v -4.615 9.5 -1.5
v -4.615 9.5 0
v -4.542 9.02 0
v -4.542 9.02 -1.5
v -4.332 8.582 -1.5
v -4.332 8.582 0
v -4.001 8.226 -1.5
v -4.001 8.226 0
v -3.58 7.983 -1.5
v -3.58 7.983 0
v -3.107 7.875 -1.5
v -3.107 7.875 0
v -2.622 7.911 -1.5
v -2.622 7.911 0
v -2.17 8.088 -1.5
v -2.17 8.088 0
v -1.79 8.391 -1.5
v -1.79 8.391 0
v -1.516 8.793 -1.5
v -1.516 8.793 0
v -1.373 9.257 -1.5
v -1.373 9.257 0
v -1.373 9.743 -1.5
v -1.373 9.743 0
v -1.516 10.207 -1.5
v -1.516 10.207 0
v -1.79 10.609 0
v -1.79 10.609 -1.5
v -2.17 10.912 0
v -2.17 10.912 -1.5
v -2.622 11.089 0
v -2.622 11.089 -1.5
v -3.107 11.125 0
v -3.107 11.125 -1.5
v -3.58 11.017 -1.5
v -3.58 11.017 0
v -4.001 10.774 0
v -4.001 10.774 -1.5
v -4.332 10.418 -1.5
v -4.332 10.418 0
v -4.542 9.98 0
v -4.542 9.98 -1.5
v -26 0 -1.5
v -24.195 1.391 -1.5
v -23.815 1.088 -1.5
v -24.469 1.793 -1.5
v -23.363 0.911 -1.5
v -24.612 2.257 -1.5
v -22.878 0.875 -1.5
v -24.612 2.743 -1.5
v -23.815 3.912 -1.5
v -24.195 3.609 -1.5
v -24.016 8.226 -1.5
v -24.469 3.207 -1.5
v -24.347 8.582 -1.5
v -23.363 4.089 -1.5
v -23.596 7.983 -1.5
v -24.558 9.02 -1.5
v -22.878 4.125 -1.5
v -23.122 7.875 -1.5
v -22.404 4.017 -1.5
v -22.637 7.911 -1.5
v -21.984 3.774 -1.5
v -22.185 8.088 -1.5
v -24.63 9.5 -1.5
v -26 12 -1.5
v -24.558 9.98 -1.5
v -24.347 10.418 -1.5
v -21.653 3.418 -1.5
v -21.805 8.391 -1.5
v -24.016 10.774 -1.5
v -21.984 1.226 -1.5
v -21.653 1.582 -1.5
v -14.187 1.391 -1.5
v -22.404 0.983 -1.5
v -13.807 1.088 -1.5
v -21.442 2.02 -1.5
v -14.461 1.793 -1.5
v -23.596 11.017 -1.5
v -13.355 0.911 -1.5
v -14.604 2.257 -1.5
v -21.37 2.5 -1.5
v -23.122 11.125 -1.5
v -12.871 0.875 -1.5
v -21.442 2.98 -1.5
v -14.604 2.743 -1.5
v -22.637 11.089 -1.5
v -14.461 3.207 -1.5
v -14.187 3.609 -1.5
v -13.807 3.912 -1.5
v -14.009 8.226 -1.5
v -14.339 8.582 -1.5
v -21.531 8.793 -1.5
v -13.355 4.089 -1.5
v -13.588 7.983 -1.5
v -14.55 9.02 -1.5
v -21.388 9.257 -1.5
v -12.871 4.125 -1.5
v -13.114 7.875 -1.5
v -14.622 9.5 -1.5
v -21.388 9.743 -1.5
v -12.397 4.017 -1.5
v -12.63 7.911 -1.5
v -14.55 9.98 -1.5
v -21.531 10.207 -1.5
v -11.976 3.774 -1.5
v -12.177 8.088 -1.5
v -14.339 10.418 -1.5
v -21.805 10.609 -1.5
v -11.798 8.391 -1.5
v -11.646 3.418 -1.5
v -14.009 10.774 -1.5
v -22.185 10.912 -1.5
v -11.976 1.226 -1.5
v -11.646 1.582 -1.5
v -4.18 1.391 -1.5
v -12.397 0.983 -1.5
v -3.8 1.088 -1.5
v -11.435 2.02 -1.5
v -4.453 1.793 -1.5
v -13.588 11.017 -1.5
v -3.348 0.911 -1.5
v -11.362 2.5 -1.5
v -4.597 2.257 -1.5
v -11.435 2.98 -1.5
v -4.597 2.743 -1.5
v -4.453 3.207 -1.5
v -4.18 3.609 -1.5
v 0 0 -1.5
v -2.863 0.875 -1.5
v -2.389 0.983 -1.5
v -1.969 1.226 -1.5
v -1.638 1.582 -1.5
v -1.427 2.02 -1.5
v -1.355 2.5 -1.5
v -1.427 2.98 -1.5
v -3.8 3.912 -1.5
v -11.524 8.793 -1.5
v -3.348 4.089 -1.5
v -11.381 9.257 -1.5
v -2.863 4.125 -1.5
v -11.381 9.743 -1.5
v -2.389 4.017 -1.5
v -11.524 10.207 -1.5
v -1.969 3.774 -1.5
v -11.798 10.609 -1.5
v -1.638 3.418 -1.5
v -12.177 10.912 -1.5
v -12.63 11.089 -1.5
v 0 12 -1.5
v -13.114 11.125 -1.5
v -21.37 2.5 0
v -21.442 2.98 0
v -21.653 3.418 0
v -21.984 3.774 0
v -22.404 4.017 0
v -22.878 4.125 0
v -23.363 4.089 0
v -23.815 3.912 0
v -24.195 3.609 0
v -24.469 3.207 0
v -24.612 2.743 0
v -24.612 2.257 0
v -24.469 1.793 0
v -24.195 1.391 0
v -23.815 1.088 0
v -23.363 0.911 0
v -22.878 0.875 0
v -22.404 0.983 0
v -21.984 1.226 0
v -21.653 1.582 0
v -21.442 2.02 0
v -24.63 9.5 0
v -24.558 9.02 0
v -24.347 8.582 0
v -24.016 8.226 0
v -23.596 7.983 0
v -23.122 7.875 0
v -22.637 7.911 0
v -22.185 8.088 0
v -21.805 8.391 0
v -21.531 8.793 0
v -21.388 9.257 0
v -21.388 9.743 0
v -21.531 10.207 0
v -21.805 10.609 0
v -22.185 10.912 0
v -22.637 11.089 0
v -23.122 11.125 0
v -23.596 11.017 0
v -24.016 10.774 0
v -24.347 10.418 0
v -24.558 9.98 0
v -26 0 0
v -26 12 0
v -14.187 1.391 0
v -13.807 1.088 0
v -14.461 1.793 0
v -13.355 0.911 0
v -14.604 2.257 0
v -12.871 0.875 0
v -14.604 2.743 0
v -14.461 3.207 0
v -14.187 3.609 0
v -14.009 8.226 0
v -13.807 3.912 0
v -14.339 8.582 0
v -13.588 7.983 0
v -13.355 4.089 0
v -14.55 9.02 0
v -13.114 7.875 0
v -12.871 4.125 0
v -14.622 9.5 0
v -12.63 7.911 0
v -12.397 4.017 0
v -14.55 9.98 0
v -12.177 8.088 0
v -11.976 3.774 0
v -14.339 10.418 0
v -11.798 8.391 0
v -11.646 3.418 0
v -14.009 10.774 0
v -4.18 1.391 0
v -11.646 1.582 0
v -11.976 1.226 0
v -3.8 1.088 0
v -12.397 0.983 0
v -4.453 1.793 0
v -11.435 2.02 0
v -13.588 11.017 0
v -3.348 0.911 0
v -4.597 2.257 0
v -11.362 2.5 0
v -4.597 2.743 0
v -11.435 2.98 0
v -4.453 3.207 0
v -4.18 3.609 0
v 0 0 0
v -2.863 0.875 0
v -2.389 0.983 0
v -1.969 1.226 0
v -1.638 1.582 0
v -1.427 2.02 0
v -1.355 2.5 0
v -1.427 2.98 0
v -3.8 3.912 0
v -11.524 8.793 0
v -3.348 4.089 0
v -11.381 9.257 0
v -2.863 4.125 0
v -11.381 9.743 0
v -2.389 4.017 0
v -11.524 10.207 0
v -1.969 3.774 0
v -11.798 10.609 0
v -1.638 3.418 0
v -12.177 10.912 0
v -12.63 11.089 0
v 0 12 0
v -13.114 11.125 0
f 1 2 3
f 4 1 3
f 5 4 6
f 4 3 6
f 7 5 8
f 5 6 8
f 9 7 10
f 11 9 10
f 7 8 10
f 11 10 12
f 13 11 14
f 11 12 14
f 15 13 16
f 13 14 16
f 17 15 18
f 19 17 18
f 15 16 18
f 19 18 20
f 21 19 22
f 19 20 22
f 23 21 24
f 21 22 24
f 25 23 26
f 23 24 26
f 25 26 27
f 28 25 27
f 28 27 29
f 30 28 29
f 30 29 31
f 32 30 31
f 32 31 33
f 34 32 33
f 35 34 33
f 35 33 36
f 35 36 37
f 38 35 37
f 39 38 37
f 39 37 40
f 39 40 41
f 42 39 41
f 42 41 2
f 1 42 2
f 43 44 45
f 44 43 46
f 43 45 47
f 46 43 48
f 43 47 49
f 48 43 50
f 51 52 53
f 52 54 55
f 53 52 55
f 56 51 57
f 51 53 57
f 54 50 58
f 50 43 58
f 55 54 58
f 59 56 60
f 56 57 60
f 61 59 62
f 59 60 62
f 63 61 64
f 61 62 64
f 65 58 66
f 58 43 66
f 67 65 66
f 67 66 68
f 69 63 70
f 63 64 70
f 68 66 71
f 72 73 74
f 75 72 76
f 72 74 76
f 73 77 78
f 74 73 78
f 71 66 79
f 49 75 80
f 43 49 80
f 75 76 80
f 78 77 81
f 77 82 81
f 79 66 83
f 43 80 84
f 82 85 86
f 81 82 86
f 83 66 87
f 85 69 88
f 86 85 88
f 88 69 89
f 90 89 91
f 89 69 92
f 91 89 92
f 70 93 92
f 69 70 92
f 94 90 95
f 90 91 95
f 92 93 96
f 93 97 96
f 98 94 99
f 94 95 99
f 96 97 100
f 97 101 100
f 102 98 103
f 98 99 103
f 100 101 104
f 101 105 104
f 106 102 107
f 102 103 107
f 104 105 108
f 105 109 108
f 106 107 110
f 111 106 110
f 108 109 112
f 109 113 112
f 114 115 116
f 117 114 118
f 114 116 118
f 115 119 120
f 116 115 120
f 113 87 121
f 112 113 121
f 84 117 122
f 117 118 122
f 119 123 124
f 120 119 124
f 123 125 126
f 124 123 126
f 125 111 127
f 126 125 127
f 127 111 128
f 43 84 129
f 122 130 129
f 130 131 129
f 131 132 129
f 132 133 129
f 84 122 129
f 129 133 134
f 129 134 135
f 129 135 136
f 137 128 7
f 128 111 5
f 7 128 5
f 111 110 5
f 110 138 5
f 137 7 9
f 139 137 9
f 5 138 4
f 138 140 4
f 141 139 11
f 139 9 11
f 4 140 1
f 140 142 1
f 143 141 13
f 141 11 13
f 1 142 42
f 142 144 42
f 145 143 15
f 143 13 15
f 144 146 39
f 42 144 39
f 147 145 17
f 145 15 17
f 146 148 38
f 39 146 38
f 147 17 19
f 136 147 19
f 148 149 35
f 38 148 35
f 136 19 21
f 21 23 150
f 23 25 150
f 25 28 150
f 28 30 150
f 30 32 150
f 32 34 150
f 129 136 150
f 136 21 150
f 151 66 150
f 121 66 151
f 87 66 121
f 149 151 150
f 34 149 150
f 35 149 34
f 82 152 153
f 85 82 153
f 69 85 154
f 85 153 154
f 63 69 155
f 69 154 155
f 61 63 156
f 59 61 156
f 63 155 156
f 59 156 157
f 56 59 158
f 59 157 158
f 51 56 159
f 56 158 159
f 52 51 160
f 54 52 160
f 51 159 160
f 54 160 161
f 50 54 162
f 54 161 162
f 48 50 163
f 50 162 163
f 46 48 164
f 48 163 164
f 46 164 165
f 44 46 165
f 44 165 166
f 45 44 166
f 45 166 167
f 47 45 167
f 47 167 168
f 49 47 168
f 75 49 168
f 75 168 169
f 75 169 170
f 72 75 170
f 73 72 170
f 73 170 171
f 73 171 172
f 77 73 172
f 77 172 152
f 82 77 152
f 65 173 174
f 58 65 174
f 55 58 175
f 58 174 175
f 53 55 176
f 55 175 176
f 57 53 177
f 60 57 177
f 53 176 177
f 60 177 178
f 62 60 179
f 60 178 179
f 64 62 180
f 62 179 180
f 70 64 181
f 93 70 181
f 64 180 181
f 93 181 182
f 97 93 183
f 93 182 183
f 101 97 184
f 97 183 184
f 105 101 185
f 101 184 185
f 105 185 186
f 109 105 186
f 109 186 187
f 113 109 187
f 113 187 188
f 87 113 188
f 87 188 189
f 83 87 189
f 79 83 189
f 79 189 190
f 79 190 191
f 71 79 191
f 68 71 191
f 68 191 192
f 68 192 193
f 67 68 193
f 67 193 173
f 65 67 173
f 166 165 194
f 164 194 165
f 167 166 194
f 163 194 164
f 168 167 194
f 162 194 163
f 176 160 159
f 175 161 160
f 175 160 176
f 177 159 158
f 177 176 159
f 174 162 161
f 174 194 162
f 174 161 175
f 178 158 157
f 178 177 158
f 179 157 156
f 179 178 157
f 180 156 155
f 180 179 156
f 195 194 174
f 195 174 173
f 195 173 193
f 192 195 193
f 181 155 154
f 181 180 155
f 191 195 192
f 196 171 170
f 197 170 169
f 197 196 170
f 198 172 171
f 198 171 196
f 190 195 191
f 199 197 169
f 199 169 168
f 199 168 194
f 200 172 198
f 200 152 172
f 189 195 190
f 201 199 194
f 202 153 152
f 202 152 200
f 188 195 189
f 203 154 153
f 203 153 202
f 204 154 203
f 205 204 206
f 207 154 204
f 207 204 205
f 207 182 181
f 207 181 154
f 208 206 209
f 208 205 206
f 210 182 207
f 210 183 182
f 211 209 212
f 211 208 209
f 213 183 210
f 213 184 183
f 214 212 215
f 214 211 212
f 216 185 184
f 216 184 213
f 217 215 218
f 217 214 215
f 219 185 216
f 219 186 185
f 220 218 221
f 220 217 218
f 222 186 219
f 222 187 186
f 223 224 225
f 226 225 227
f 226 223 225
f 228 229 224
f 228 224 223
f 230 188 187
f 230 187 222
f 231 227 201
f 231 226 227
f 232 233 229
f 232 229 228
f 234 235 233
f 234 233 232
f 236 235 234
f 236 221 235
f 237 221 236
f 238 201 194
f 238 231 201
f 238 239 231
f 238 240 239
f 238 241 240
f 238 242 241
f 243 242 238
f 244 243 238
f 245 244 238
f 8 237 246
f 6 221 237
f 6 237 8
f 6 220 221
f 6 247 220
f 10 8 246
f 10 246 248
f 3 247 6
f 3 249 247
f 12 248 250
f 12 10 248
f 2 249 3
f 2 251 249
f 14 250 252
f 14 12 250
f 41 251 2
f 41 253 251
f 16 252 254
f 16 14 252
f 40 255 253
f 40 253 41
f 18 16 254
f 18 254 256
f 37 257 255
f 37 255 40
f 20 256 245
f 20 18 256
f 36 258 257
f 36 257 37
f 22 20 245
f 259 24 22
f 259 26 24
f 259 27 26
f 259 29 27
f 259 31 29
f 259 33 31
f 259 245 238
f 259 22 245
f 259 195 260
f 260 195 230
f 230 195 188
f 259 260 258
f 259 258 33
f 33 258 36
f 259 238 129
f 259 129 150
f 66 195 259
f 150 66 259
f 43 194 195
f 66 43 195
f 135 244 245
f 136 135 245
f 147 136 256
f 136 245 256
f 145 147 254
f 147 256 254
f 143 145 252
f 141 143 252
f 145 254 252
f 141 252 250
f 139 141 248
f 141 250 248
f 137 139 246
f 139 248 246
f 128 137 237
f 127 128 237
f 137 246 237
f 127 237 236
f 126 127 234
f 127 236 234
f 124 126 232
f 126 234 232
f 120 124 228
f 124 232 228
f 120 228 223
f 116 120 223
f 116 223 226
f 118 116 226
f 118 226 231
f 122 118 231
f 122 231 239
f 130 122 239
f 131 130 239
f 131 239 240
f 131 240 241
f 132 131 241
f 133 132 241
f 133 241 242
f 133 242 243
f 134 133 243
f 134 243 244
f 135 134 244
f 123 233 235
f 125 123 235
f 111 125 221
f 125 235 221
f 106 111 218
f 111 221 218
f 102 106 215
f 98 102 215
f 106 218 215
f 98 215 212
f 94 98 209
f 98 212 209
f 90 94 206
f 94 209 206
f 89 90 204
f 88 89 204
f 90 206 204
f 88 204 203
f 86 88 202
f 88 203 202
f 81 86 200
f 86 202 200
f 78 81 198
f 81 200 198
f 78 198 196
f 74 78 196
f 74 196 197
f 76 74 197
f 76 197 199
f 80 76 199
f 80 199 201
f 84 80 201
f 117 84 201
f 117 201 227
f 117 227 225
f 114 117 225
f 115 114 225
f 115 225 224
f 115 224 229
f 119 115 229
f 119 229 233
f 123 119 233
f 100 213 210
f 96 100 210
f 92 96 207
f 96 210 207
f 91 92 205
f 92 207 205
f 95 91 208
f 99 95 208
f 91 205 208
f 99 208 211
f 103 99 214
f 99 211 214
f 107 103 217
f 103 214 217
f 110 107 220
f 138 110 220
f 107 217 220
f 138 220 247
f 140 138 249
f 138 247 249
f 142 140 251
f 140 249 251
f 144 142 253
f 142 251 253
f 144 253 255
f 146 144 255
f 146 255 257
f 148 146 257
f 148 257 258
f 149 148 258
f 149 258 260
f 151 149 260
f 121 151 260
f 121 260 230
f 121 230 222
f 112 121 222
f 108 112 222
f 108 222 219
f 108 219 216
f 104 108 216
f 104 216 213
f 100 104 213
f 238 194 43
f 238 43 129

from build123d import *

# Parameters (mm, degrees)
SKETCH1_W      = 26
SKETCH1_H      = 12
EXTRUDE1_DEPTH = 1.5
SKETCH2_R      = 1.63
EXTRUDE2_DEPTH = 2.5


with BuildPart() as part:
    # Sketch1 → Extrude1 (new body)
    with BuildSketch(Plane.XY):
        with Locations((-13, 6)):
            Rectangle(SKETCH1_W, SKETCH1_H)
    extrude(amount=-EXTRUDE1_DEPTH)

    # Sketch2 → Extrude2 (cut, through all)
    with BuildSketch(Plane.XY):
        with Locations((-12.9924, 2.5)):
            Circle(SKETCH2_R)
        with Locations((-2.9848, 2.5)):
            Circle(SKETCH2_R)
        with Locations(Location((-2.9848, 9.5, 0), (0, 0, 180))):  # turned: the seam where the file's is
            Circle(SKETCH2_R)
        with Locations(Location((-12.9924, 9.5, 0), (0, 0, 180))):  # turned: the seam where the file's is
            Circle(SKETCH2_R)
        with Locations((-23, 2.5)):
            Circle(SKETCH2_R)
        with Locations(Location((-23, 9.5, 0), (0, 0, 180))):  # turned: the seam where the file's is
            Circle(SKETCH2_R)
    extrude(amount=-EXTRUDE2_DEPTH, mode=Mode.SUBTRACT)


solid = part.part
